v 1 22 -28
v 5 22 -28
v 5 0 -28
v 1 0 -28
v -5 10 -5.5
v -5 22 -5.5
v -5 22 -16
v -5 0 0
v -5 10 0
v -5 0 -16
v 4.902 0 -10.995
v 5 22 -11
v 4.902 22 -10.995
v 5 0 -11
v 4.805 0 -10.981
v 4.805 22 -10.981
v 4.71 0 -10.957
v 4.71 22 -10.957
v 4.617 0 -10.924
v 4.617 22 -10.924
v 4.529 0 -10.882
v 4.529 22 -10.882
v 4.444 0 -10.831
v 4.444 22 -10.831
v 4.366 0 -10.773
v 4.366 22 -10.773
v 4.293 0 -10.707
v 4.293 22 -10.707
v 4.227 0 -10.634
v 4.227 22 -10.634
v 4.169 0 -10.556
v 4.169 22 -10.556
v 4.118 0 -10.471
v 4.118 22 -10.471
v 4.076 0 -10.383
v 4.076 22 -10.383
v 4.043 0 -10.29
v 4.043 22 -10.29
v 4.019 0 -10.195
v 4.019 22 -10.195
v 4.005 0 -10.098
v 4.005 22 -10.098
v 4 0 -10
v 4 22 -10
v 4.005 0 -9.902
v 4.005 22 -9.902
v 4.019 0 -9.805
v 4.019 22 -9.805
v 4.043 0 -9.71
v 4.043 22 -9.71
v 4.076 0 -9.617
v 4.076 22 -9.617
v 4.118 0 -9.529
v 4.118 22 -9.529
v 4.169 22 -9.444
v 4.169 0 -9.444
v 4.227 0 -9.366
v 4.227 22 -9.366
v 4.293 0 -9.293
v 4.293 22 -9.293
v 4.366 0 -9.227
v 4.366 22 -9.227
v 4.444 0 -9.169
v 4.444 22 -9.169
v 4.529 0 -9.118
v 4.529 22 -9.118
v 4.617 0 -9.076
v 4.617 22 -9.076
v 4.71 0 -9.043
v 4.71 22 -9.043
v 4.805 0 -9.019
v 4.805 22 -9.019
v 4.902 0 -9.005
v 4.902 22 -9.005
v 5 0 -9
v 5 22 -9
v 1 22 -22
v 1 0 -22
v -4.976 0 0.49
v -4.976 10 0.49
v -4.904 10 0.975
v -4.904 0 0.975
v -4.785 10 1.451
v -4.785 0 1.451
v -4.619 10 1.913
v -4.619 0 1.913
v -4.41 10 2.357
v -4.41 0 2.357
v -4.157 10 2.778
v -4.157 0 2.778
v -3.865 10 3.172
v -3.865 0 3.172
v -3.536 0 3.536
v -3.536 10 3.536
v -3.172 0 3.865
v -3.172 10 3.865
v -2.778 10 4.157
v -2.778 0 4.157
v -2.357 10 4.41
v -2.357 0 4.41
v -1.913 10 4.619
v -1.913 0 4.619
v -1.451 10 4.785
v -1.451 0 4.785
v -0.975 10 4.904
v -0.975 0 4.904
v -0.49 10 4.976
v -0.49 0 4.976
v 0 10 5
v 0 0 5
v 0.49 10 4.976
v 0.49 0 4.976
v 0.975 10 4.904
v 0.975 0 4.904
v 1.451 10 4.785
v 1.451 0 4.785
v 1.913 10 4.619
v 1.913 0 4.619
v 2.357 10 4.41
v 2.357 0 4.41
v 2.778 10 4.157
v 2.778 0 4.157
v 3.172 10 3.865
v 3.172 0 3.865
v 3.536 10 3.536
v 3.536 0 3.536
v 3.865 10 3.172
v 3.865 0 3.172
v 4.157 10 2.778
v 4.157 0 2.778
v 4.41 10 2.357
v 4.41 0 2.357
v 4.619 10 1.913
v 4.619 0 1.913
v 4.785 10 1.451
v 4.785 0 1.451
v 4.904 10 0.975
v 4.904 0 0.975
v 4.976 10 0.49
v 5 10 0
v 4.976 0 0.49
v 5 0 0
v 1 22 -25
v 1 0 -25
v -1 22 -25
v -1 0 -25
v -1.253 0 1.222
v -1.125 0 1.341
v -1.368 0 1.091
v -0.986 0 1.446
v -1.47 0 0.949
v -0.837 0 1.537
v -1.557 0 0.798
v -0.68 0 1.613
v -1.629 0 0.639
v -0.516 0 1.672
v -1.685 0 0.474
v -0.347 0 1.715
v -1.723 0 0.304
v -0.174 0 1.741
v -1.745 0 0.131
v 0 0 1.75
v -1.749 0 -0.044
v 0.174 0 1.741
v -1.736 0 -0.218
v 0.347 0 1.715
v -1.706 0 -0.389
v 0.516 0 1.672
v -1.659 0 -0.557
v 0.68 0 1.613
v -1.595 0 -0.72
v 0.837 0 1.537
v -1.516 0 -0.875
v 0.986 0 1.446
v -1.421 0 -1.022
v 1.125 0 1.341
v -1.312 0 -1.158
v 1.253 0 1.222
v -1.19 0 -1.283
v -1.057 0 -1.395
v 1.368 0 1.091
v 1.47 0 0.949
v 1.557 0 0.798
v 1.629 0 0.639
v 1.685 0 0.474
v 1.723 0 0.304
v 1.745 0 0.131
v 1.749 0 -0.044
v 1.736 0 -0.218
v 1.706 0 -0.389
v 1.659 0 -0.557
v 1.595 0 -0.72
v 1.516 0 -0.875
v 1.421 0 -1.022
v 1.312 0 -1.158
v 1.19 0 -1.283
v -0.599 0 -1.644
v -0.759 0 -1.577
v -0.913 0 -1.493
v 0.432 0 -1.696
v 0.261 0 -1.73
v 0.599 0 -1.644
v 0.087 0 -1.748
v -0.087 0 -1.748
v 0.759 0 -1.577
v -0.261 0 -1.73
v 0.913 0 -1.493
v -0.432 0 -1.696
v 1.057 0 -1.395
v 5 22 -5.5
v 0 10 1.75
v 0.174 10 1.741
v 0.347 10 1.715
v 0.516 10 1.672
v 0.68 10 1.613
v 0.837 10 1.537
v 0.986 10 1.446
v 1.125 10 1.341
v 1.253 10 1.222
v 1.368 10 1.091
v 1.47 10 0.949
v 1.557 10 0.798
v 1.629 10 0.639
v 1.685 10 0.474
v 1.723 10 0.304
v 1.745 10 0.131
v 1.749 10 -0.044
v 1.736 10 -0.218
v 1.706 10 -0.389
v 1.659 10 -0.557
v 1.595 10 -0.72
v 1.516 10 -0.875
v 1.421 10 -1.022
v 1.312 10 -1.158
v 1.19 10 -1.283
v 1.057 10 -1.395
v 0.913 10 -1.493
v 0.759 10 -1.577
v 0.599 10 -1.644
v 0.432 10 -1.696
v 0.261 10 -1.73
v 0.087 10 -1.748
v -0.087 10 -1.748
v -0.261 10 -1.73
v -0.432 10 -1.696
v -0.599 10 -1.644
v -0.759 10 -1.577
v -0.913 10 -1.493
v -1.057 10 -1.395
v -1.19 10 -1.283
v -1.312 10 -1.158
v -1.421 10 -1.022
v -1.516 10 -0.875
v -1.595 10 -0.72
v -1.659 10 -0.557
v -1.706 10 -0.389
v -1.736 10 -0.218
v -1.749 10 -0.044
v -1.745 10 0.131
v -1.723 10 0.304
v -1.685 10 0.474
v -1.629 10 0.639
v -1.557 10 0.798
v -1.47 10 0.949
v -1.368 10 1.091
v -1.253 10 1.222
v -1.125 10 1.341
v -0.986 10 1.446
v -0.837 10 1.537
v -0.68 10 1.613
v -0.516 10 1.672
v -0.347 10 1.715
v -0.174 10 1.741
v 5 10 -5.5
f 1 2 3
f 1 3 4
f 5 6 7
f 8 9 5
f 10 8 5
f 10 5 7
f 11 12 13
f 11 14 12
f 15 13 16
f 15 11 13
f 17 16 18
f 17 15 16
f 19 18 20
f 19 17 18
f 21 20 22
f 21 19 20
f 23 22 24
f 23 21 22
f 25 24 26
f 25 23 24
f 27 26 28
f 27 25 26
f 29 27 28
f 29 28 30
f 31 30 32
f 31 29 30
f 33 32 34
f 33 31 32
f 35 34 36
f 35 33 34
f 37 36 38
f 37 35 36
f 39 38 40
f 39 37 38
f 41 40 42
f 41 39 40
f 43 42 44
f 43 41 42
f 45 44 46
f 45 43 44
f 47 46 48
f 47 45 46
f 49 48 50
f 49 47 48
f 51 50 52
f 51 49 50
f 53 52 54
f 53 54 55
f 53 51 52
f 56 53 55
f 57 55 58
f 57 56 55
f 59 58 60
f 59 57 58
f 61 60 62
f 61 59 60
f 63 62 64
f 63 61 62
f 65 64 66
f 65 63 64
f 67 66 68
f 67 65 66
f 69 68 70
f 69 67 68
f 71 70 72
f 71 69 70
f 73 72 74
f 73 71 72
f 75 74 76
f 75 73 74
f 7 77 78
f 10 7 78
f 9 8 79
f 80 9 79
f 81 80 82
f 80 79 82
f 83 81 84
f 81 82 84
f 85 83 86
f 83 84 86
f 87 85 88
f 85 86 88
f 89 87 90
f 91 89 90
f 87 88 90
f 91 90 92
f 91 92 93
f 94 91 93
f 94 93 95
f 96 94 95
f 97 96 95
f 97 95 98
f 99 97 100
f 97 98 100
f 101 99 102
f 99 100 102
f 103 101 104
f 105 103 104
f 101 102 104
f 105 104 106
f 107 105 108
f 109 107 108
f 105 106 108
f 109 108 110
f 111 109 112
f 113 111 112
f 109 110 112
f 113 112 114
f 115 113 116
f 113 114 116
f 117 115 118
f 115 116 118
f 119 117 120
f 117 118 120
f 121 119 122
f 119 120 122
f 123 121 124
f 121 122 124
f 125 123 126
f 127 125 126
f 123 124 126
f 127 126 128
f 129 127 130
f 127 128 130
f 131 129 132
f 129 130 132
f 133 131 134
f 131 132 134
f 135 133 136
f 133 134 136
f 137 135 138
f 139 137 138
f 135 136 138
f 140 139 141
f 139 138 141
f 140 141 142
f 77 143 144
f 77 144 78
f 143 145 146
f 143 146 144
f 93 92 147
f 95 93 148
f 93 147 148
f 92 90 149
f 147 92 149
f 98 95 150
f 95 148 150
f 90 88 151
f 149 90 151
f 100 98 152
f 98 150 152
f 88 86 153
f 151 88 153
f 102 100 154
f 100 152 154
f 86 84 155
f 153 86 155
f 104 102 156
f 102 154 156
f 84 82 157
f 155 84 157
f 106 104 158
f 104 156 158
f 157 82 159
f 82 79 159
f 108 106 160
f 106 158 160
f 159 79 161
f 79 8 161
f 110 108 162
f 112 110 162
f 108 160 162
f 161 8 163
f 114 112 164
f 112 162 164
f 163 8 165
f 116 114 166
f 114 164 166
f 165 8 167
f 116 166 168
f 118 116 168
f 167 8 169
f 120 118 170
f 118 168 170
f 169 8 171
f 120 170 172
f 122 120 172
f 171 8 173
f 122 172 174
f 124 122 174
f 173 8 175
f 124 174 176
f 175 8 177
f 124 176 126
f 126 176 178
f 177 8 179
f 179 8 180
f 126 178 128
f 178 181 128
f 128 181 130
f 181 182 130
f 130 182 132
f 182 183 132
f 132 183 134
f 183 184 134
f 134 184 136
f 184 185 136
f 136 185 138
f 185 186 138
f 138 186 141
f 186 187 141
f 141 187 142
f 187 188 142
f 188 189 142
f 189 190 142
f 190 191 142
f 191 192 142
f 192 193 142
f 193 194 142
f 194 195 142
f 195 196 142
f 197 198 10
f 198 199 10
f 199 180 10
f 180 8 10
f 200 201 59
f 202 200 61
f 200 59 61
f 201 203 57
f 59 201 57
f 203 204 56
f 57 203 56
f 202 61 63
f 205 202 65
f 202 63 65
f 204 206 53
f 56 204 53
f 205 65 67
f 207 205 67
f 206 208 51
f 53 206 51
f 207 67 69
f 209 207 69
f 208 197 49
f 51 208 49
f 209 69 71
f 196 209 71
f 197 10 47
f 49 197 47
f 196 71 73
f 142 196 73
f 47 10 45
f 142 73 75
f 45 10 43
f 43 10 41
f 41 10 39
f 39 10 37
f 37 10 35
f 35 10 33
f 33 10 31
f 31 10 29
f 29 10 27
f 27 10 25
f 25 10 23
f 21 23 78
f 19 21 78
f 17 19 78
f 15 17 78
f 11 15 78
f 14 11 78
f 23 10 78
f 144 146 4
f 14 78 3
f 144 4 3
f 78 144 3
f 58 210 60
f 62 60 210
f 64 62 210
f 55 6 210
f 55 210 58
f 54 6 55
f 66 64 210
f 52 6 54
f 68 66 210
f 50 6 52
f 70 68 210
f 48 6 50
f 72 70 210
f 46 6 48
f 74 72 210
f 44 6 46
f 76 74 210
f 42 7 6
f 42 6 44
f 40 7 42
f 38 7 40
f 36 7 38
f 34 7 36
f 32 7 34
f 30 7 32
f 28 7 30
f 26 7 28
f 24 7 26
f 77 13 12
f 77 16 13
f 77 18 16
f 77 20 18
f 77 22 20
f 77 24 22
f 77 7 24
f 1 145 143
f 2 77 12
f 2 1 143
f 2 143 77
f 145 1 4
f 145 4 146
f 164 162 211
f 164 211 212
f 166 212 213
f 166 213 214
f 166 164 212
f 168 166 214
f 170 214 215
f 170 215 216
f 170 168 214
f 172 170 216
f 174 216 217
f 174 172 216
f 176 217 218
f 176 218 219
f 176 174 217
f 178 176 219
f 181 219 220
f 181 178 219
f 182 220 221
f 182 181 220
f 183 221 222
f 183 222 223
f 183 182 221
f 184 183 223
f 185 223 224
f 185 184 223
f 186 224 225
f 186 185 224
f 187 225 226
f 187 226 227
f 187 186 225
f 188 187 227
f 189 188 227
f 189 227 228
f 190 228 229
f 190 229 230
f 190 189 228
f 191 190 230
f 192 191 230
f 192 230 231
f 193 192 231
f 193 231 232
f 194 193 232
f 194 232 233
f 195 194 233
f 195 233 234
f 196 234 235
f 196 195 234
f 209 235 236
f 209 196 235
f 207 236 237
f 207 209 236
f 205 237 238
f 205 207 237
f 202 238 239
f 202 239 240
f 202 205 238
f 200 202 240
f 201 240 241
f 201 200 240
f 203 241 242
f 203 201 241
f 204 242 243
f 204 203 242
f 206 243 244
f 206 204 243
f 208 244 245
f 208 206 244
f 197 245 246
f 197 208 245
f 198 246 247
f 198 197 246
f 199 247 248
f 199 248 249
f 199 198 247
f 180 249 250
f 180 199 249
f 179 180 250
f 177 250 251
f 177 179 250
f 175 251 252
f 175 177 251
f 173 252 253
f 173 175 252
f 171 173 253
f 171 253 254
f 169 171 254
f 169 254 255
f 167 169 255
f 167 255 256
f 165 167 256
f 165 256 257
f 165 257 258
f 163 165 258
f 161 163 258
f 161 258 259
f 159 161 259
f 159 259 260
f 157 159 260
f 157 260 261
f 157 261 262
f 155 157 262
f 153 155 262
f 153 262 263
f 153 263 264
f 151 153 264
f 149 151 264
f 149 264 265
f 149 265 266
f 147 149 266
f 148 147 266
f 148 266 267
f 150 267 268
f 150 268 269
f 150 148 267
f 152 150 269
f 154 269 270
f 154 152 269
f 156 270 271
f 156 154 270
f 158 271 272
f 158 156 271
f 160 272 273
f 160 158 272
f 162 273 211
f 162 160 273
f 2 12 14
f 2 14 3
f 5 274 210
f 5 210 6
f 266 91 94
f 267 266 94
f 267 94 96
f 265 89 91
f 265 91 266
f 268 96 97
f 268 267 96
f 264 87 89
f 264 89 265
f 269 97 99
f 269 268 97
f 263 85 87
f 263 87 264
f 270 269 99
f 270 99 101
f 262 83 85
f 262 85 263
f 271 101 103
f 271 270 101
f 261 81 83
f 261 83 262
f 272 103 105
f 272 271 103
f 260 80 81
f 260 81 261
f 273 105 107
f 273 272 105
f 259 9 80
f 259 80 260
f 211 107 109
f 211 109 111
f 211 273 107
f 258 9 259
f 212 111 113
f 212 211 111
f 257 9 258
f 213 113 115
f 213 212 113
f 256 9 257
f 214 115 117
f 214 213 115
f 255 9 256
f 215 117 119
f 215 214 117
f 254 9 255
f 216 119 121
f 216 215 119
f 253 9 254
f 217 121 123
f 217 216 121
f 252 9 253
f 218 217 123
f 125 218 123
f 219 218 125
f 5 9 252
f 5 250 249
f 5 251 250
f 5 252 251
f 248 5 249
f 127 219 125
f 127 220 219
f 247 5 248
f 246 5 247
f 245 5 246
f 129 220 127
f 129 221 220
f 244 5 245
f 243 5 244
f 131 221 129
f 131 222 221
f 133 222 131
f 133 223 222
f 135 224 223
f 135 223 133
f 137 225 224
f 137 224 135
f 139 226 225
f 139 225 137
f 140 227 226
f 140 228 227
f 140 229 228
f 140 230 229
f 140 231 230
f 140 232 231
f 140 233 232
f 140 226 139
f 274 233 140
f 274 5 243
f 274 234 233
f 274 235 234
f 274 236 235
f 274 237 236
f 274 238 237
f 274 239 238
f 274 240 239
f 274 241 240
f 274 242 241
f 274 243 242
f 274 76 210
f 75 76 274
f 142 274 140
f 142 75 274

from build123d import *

# Parameters (mm, degrees)
SKETCH1_R           = 1.75
BOSS_EXTRUDE1_DEPTH = 10
BOSS_EXTRUDE2_DEPTH = 12
BOSS_EXTRUDE3_DEPTH = 22
CHAMFER1_SIZE       = 6


with BuildPart() as part:
    # Sketch1 → Boss-Extrude1 (new body)
    with BuildSketch(Plane(origin=(0, 0, 0), x_dir=(1, 0, 0), z_dir=(0, 1, 0))):
        with BuildLine():
            Line((-5, 22), (-5, 0))
            ThreePointArc((-5, 0), (0, -5), (5, 0))
            Line((5, 0), (5, 9))
            ThreePointArc((5, 9), (4, 10), (5, 11))
            Line((5, 11), (5, 22))
            Line((5, 22), (-5, 22))
        make_face()
        with Locations(Location((0, 0, 0), (0, 0, 270))):
            Circle(SKETCH1_R, mode=Mode.SUBTRACT)
    extrude(amount=BOSS_EXTRUDE1_DEPTH)

    # Sketch3 → Boss-Extrude2 (add)
    with BuildSketch(Plane(origin=(0, 10, 0), x_dir=(1, 0, 0), z_dir=(0, 1, 0))):
        with BuildLine():
            Line((5, 5.5), (-5, 5.5))
            Line((-5, 5.5), (-5, 22))
            Line((-5, 22), (5, 22))
            Line((5, 22), (5, 11))
            ThreePointArc((5, 11), (4, 10), (5, 9))
            Line((5, 9), (5, 5.5))
        make_face()
    extrude(amount=BOSS_EXTRUDE2_DEPTH)

    # Sketch5 → Boss-Extrude3 (add)
    with BuildSketch(Plane(origin=(0, 22, 0), x_dir=(1, 0, 0), z_dir=(0, 1, 0))):
        Polygon((5, 22), (5, 28), (1, 28), (-1, 25), (1, 25), (1, 22), align=None)
    extrude(amount=-BOSS_EXTRUDE3_DEPTH)

    # Chamfer1
    chamfer1_edges = [part.edges().sort_by_distance(p)[0] for p in [
        (-5, 11, -22),
    ]]
    chamfer(chamfer1_edges, length=CHAMFER1_SIZE - 0.0001)  # a hair under: the kernel refuses the full size


solid = part.part
